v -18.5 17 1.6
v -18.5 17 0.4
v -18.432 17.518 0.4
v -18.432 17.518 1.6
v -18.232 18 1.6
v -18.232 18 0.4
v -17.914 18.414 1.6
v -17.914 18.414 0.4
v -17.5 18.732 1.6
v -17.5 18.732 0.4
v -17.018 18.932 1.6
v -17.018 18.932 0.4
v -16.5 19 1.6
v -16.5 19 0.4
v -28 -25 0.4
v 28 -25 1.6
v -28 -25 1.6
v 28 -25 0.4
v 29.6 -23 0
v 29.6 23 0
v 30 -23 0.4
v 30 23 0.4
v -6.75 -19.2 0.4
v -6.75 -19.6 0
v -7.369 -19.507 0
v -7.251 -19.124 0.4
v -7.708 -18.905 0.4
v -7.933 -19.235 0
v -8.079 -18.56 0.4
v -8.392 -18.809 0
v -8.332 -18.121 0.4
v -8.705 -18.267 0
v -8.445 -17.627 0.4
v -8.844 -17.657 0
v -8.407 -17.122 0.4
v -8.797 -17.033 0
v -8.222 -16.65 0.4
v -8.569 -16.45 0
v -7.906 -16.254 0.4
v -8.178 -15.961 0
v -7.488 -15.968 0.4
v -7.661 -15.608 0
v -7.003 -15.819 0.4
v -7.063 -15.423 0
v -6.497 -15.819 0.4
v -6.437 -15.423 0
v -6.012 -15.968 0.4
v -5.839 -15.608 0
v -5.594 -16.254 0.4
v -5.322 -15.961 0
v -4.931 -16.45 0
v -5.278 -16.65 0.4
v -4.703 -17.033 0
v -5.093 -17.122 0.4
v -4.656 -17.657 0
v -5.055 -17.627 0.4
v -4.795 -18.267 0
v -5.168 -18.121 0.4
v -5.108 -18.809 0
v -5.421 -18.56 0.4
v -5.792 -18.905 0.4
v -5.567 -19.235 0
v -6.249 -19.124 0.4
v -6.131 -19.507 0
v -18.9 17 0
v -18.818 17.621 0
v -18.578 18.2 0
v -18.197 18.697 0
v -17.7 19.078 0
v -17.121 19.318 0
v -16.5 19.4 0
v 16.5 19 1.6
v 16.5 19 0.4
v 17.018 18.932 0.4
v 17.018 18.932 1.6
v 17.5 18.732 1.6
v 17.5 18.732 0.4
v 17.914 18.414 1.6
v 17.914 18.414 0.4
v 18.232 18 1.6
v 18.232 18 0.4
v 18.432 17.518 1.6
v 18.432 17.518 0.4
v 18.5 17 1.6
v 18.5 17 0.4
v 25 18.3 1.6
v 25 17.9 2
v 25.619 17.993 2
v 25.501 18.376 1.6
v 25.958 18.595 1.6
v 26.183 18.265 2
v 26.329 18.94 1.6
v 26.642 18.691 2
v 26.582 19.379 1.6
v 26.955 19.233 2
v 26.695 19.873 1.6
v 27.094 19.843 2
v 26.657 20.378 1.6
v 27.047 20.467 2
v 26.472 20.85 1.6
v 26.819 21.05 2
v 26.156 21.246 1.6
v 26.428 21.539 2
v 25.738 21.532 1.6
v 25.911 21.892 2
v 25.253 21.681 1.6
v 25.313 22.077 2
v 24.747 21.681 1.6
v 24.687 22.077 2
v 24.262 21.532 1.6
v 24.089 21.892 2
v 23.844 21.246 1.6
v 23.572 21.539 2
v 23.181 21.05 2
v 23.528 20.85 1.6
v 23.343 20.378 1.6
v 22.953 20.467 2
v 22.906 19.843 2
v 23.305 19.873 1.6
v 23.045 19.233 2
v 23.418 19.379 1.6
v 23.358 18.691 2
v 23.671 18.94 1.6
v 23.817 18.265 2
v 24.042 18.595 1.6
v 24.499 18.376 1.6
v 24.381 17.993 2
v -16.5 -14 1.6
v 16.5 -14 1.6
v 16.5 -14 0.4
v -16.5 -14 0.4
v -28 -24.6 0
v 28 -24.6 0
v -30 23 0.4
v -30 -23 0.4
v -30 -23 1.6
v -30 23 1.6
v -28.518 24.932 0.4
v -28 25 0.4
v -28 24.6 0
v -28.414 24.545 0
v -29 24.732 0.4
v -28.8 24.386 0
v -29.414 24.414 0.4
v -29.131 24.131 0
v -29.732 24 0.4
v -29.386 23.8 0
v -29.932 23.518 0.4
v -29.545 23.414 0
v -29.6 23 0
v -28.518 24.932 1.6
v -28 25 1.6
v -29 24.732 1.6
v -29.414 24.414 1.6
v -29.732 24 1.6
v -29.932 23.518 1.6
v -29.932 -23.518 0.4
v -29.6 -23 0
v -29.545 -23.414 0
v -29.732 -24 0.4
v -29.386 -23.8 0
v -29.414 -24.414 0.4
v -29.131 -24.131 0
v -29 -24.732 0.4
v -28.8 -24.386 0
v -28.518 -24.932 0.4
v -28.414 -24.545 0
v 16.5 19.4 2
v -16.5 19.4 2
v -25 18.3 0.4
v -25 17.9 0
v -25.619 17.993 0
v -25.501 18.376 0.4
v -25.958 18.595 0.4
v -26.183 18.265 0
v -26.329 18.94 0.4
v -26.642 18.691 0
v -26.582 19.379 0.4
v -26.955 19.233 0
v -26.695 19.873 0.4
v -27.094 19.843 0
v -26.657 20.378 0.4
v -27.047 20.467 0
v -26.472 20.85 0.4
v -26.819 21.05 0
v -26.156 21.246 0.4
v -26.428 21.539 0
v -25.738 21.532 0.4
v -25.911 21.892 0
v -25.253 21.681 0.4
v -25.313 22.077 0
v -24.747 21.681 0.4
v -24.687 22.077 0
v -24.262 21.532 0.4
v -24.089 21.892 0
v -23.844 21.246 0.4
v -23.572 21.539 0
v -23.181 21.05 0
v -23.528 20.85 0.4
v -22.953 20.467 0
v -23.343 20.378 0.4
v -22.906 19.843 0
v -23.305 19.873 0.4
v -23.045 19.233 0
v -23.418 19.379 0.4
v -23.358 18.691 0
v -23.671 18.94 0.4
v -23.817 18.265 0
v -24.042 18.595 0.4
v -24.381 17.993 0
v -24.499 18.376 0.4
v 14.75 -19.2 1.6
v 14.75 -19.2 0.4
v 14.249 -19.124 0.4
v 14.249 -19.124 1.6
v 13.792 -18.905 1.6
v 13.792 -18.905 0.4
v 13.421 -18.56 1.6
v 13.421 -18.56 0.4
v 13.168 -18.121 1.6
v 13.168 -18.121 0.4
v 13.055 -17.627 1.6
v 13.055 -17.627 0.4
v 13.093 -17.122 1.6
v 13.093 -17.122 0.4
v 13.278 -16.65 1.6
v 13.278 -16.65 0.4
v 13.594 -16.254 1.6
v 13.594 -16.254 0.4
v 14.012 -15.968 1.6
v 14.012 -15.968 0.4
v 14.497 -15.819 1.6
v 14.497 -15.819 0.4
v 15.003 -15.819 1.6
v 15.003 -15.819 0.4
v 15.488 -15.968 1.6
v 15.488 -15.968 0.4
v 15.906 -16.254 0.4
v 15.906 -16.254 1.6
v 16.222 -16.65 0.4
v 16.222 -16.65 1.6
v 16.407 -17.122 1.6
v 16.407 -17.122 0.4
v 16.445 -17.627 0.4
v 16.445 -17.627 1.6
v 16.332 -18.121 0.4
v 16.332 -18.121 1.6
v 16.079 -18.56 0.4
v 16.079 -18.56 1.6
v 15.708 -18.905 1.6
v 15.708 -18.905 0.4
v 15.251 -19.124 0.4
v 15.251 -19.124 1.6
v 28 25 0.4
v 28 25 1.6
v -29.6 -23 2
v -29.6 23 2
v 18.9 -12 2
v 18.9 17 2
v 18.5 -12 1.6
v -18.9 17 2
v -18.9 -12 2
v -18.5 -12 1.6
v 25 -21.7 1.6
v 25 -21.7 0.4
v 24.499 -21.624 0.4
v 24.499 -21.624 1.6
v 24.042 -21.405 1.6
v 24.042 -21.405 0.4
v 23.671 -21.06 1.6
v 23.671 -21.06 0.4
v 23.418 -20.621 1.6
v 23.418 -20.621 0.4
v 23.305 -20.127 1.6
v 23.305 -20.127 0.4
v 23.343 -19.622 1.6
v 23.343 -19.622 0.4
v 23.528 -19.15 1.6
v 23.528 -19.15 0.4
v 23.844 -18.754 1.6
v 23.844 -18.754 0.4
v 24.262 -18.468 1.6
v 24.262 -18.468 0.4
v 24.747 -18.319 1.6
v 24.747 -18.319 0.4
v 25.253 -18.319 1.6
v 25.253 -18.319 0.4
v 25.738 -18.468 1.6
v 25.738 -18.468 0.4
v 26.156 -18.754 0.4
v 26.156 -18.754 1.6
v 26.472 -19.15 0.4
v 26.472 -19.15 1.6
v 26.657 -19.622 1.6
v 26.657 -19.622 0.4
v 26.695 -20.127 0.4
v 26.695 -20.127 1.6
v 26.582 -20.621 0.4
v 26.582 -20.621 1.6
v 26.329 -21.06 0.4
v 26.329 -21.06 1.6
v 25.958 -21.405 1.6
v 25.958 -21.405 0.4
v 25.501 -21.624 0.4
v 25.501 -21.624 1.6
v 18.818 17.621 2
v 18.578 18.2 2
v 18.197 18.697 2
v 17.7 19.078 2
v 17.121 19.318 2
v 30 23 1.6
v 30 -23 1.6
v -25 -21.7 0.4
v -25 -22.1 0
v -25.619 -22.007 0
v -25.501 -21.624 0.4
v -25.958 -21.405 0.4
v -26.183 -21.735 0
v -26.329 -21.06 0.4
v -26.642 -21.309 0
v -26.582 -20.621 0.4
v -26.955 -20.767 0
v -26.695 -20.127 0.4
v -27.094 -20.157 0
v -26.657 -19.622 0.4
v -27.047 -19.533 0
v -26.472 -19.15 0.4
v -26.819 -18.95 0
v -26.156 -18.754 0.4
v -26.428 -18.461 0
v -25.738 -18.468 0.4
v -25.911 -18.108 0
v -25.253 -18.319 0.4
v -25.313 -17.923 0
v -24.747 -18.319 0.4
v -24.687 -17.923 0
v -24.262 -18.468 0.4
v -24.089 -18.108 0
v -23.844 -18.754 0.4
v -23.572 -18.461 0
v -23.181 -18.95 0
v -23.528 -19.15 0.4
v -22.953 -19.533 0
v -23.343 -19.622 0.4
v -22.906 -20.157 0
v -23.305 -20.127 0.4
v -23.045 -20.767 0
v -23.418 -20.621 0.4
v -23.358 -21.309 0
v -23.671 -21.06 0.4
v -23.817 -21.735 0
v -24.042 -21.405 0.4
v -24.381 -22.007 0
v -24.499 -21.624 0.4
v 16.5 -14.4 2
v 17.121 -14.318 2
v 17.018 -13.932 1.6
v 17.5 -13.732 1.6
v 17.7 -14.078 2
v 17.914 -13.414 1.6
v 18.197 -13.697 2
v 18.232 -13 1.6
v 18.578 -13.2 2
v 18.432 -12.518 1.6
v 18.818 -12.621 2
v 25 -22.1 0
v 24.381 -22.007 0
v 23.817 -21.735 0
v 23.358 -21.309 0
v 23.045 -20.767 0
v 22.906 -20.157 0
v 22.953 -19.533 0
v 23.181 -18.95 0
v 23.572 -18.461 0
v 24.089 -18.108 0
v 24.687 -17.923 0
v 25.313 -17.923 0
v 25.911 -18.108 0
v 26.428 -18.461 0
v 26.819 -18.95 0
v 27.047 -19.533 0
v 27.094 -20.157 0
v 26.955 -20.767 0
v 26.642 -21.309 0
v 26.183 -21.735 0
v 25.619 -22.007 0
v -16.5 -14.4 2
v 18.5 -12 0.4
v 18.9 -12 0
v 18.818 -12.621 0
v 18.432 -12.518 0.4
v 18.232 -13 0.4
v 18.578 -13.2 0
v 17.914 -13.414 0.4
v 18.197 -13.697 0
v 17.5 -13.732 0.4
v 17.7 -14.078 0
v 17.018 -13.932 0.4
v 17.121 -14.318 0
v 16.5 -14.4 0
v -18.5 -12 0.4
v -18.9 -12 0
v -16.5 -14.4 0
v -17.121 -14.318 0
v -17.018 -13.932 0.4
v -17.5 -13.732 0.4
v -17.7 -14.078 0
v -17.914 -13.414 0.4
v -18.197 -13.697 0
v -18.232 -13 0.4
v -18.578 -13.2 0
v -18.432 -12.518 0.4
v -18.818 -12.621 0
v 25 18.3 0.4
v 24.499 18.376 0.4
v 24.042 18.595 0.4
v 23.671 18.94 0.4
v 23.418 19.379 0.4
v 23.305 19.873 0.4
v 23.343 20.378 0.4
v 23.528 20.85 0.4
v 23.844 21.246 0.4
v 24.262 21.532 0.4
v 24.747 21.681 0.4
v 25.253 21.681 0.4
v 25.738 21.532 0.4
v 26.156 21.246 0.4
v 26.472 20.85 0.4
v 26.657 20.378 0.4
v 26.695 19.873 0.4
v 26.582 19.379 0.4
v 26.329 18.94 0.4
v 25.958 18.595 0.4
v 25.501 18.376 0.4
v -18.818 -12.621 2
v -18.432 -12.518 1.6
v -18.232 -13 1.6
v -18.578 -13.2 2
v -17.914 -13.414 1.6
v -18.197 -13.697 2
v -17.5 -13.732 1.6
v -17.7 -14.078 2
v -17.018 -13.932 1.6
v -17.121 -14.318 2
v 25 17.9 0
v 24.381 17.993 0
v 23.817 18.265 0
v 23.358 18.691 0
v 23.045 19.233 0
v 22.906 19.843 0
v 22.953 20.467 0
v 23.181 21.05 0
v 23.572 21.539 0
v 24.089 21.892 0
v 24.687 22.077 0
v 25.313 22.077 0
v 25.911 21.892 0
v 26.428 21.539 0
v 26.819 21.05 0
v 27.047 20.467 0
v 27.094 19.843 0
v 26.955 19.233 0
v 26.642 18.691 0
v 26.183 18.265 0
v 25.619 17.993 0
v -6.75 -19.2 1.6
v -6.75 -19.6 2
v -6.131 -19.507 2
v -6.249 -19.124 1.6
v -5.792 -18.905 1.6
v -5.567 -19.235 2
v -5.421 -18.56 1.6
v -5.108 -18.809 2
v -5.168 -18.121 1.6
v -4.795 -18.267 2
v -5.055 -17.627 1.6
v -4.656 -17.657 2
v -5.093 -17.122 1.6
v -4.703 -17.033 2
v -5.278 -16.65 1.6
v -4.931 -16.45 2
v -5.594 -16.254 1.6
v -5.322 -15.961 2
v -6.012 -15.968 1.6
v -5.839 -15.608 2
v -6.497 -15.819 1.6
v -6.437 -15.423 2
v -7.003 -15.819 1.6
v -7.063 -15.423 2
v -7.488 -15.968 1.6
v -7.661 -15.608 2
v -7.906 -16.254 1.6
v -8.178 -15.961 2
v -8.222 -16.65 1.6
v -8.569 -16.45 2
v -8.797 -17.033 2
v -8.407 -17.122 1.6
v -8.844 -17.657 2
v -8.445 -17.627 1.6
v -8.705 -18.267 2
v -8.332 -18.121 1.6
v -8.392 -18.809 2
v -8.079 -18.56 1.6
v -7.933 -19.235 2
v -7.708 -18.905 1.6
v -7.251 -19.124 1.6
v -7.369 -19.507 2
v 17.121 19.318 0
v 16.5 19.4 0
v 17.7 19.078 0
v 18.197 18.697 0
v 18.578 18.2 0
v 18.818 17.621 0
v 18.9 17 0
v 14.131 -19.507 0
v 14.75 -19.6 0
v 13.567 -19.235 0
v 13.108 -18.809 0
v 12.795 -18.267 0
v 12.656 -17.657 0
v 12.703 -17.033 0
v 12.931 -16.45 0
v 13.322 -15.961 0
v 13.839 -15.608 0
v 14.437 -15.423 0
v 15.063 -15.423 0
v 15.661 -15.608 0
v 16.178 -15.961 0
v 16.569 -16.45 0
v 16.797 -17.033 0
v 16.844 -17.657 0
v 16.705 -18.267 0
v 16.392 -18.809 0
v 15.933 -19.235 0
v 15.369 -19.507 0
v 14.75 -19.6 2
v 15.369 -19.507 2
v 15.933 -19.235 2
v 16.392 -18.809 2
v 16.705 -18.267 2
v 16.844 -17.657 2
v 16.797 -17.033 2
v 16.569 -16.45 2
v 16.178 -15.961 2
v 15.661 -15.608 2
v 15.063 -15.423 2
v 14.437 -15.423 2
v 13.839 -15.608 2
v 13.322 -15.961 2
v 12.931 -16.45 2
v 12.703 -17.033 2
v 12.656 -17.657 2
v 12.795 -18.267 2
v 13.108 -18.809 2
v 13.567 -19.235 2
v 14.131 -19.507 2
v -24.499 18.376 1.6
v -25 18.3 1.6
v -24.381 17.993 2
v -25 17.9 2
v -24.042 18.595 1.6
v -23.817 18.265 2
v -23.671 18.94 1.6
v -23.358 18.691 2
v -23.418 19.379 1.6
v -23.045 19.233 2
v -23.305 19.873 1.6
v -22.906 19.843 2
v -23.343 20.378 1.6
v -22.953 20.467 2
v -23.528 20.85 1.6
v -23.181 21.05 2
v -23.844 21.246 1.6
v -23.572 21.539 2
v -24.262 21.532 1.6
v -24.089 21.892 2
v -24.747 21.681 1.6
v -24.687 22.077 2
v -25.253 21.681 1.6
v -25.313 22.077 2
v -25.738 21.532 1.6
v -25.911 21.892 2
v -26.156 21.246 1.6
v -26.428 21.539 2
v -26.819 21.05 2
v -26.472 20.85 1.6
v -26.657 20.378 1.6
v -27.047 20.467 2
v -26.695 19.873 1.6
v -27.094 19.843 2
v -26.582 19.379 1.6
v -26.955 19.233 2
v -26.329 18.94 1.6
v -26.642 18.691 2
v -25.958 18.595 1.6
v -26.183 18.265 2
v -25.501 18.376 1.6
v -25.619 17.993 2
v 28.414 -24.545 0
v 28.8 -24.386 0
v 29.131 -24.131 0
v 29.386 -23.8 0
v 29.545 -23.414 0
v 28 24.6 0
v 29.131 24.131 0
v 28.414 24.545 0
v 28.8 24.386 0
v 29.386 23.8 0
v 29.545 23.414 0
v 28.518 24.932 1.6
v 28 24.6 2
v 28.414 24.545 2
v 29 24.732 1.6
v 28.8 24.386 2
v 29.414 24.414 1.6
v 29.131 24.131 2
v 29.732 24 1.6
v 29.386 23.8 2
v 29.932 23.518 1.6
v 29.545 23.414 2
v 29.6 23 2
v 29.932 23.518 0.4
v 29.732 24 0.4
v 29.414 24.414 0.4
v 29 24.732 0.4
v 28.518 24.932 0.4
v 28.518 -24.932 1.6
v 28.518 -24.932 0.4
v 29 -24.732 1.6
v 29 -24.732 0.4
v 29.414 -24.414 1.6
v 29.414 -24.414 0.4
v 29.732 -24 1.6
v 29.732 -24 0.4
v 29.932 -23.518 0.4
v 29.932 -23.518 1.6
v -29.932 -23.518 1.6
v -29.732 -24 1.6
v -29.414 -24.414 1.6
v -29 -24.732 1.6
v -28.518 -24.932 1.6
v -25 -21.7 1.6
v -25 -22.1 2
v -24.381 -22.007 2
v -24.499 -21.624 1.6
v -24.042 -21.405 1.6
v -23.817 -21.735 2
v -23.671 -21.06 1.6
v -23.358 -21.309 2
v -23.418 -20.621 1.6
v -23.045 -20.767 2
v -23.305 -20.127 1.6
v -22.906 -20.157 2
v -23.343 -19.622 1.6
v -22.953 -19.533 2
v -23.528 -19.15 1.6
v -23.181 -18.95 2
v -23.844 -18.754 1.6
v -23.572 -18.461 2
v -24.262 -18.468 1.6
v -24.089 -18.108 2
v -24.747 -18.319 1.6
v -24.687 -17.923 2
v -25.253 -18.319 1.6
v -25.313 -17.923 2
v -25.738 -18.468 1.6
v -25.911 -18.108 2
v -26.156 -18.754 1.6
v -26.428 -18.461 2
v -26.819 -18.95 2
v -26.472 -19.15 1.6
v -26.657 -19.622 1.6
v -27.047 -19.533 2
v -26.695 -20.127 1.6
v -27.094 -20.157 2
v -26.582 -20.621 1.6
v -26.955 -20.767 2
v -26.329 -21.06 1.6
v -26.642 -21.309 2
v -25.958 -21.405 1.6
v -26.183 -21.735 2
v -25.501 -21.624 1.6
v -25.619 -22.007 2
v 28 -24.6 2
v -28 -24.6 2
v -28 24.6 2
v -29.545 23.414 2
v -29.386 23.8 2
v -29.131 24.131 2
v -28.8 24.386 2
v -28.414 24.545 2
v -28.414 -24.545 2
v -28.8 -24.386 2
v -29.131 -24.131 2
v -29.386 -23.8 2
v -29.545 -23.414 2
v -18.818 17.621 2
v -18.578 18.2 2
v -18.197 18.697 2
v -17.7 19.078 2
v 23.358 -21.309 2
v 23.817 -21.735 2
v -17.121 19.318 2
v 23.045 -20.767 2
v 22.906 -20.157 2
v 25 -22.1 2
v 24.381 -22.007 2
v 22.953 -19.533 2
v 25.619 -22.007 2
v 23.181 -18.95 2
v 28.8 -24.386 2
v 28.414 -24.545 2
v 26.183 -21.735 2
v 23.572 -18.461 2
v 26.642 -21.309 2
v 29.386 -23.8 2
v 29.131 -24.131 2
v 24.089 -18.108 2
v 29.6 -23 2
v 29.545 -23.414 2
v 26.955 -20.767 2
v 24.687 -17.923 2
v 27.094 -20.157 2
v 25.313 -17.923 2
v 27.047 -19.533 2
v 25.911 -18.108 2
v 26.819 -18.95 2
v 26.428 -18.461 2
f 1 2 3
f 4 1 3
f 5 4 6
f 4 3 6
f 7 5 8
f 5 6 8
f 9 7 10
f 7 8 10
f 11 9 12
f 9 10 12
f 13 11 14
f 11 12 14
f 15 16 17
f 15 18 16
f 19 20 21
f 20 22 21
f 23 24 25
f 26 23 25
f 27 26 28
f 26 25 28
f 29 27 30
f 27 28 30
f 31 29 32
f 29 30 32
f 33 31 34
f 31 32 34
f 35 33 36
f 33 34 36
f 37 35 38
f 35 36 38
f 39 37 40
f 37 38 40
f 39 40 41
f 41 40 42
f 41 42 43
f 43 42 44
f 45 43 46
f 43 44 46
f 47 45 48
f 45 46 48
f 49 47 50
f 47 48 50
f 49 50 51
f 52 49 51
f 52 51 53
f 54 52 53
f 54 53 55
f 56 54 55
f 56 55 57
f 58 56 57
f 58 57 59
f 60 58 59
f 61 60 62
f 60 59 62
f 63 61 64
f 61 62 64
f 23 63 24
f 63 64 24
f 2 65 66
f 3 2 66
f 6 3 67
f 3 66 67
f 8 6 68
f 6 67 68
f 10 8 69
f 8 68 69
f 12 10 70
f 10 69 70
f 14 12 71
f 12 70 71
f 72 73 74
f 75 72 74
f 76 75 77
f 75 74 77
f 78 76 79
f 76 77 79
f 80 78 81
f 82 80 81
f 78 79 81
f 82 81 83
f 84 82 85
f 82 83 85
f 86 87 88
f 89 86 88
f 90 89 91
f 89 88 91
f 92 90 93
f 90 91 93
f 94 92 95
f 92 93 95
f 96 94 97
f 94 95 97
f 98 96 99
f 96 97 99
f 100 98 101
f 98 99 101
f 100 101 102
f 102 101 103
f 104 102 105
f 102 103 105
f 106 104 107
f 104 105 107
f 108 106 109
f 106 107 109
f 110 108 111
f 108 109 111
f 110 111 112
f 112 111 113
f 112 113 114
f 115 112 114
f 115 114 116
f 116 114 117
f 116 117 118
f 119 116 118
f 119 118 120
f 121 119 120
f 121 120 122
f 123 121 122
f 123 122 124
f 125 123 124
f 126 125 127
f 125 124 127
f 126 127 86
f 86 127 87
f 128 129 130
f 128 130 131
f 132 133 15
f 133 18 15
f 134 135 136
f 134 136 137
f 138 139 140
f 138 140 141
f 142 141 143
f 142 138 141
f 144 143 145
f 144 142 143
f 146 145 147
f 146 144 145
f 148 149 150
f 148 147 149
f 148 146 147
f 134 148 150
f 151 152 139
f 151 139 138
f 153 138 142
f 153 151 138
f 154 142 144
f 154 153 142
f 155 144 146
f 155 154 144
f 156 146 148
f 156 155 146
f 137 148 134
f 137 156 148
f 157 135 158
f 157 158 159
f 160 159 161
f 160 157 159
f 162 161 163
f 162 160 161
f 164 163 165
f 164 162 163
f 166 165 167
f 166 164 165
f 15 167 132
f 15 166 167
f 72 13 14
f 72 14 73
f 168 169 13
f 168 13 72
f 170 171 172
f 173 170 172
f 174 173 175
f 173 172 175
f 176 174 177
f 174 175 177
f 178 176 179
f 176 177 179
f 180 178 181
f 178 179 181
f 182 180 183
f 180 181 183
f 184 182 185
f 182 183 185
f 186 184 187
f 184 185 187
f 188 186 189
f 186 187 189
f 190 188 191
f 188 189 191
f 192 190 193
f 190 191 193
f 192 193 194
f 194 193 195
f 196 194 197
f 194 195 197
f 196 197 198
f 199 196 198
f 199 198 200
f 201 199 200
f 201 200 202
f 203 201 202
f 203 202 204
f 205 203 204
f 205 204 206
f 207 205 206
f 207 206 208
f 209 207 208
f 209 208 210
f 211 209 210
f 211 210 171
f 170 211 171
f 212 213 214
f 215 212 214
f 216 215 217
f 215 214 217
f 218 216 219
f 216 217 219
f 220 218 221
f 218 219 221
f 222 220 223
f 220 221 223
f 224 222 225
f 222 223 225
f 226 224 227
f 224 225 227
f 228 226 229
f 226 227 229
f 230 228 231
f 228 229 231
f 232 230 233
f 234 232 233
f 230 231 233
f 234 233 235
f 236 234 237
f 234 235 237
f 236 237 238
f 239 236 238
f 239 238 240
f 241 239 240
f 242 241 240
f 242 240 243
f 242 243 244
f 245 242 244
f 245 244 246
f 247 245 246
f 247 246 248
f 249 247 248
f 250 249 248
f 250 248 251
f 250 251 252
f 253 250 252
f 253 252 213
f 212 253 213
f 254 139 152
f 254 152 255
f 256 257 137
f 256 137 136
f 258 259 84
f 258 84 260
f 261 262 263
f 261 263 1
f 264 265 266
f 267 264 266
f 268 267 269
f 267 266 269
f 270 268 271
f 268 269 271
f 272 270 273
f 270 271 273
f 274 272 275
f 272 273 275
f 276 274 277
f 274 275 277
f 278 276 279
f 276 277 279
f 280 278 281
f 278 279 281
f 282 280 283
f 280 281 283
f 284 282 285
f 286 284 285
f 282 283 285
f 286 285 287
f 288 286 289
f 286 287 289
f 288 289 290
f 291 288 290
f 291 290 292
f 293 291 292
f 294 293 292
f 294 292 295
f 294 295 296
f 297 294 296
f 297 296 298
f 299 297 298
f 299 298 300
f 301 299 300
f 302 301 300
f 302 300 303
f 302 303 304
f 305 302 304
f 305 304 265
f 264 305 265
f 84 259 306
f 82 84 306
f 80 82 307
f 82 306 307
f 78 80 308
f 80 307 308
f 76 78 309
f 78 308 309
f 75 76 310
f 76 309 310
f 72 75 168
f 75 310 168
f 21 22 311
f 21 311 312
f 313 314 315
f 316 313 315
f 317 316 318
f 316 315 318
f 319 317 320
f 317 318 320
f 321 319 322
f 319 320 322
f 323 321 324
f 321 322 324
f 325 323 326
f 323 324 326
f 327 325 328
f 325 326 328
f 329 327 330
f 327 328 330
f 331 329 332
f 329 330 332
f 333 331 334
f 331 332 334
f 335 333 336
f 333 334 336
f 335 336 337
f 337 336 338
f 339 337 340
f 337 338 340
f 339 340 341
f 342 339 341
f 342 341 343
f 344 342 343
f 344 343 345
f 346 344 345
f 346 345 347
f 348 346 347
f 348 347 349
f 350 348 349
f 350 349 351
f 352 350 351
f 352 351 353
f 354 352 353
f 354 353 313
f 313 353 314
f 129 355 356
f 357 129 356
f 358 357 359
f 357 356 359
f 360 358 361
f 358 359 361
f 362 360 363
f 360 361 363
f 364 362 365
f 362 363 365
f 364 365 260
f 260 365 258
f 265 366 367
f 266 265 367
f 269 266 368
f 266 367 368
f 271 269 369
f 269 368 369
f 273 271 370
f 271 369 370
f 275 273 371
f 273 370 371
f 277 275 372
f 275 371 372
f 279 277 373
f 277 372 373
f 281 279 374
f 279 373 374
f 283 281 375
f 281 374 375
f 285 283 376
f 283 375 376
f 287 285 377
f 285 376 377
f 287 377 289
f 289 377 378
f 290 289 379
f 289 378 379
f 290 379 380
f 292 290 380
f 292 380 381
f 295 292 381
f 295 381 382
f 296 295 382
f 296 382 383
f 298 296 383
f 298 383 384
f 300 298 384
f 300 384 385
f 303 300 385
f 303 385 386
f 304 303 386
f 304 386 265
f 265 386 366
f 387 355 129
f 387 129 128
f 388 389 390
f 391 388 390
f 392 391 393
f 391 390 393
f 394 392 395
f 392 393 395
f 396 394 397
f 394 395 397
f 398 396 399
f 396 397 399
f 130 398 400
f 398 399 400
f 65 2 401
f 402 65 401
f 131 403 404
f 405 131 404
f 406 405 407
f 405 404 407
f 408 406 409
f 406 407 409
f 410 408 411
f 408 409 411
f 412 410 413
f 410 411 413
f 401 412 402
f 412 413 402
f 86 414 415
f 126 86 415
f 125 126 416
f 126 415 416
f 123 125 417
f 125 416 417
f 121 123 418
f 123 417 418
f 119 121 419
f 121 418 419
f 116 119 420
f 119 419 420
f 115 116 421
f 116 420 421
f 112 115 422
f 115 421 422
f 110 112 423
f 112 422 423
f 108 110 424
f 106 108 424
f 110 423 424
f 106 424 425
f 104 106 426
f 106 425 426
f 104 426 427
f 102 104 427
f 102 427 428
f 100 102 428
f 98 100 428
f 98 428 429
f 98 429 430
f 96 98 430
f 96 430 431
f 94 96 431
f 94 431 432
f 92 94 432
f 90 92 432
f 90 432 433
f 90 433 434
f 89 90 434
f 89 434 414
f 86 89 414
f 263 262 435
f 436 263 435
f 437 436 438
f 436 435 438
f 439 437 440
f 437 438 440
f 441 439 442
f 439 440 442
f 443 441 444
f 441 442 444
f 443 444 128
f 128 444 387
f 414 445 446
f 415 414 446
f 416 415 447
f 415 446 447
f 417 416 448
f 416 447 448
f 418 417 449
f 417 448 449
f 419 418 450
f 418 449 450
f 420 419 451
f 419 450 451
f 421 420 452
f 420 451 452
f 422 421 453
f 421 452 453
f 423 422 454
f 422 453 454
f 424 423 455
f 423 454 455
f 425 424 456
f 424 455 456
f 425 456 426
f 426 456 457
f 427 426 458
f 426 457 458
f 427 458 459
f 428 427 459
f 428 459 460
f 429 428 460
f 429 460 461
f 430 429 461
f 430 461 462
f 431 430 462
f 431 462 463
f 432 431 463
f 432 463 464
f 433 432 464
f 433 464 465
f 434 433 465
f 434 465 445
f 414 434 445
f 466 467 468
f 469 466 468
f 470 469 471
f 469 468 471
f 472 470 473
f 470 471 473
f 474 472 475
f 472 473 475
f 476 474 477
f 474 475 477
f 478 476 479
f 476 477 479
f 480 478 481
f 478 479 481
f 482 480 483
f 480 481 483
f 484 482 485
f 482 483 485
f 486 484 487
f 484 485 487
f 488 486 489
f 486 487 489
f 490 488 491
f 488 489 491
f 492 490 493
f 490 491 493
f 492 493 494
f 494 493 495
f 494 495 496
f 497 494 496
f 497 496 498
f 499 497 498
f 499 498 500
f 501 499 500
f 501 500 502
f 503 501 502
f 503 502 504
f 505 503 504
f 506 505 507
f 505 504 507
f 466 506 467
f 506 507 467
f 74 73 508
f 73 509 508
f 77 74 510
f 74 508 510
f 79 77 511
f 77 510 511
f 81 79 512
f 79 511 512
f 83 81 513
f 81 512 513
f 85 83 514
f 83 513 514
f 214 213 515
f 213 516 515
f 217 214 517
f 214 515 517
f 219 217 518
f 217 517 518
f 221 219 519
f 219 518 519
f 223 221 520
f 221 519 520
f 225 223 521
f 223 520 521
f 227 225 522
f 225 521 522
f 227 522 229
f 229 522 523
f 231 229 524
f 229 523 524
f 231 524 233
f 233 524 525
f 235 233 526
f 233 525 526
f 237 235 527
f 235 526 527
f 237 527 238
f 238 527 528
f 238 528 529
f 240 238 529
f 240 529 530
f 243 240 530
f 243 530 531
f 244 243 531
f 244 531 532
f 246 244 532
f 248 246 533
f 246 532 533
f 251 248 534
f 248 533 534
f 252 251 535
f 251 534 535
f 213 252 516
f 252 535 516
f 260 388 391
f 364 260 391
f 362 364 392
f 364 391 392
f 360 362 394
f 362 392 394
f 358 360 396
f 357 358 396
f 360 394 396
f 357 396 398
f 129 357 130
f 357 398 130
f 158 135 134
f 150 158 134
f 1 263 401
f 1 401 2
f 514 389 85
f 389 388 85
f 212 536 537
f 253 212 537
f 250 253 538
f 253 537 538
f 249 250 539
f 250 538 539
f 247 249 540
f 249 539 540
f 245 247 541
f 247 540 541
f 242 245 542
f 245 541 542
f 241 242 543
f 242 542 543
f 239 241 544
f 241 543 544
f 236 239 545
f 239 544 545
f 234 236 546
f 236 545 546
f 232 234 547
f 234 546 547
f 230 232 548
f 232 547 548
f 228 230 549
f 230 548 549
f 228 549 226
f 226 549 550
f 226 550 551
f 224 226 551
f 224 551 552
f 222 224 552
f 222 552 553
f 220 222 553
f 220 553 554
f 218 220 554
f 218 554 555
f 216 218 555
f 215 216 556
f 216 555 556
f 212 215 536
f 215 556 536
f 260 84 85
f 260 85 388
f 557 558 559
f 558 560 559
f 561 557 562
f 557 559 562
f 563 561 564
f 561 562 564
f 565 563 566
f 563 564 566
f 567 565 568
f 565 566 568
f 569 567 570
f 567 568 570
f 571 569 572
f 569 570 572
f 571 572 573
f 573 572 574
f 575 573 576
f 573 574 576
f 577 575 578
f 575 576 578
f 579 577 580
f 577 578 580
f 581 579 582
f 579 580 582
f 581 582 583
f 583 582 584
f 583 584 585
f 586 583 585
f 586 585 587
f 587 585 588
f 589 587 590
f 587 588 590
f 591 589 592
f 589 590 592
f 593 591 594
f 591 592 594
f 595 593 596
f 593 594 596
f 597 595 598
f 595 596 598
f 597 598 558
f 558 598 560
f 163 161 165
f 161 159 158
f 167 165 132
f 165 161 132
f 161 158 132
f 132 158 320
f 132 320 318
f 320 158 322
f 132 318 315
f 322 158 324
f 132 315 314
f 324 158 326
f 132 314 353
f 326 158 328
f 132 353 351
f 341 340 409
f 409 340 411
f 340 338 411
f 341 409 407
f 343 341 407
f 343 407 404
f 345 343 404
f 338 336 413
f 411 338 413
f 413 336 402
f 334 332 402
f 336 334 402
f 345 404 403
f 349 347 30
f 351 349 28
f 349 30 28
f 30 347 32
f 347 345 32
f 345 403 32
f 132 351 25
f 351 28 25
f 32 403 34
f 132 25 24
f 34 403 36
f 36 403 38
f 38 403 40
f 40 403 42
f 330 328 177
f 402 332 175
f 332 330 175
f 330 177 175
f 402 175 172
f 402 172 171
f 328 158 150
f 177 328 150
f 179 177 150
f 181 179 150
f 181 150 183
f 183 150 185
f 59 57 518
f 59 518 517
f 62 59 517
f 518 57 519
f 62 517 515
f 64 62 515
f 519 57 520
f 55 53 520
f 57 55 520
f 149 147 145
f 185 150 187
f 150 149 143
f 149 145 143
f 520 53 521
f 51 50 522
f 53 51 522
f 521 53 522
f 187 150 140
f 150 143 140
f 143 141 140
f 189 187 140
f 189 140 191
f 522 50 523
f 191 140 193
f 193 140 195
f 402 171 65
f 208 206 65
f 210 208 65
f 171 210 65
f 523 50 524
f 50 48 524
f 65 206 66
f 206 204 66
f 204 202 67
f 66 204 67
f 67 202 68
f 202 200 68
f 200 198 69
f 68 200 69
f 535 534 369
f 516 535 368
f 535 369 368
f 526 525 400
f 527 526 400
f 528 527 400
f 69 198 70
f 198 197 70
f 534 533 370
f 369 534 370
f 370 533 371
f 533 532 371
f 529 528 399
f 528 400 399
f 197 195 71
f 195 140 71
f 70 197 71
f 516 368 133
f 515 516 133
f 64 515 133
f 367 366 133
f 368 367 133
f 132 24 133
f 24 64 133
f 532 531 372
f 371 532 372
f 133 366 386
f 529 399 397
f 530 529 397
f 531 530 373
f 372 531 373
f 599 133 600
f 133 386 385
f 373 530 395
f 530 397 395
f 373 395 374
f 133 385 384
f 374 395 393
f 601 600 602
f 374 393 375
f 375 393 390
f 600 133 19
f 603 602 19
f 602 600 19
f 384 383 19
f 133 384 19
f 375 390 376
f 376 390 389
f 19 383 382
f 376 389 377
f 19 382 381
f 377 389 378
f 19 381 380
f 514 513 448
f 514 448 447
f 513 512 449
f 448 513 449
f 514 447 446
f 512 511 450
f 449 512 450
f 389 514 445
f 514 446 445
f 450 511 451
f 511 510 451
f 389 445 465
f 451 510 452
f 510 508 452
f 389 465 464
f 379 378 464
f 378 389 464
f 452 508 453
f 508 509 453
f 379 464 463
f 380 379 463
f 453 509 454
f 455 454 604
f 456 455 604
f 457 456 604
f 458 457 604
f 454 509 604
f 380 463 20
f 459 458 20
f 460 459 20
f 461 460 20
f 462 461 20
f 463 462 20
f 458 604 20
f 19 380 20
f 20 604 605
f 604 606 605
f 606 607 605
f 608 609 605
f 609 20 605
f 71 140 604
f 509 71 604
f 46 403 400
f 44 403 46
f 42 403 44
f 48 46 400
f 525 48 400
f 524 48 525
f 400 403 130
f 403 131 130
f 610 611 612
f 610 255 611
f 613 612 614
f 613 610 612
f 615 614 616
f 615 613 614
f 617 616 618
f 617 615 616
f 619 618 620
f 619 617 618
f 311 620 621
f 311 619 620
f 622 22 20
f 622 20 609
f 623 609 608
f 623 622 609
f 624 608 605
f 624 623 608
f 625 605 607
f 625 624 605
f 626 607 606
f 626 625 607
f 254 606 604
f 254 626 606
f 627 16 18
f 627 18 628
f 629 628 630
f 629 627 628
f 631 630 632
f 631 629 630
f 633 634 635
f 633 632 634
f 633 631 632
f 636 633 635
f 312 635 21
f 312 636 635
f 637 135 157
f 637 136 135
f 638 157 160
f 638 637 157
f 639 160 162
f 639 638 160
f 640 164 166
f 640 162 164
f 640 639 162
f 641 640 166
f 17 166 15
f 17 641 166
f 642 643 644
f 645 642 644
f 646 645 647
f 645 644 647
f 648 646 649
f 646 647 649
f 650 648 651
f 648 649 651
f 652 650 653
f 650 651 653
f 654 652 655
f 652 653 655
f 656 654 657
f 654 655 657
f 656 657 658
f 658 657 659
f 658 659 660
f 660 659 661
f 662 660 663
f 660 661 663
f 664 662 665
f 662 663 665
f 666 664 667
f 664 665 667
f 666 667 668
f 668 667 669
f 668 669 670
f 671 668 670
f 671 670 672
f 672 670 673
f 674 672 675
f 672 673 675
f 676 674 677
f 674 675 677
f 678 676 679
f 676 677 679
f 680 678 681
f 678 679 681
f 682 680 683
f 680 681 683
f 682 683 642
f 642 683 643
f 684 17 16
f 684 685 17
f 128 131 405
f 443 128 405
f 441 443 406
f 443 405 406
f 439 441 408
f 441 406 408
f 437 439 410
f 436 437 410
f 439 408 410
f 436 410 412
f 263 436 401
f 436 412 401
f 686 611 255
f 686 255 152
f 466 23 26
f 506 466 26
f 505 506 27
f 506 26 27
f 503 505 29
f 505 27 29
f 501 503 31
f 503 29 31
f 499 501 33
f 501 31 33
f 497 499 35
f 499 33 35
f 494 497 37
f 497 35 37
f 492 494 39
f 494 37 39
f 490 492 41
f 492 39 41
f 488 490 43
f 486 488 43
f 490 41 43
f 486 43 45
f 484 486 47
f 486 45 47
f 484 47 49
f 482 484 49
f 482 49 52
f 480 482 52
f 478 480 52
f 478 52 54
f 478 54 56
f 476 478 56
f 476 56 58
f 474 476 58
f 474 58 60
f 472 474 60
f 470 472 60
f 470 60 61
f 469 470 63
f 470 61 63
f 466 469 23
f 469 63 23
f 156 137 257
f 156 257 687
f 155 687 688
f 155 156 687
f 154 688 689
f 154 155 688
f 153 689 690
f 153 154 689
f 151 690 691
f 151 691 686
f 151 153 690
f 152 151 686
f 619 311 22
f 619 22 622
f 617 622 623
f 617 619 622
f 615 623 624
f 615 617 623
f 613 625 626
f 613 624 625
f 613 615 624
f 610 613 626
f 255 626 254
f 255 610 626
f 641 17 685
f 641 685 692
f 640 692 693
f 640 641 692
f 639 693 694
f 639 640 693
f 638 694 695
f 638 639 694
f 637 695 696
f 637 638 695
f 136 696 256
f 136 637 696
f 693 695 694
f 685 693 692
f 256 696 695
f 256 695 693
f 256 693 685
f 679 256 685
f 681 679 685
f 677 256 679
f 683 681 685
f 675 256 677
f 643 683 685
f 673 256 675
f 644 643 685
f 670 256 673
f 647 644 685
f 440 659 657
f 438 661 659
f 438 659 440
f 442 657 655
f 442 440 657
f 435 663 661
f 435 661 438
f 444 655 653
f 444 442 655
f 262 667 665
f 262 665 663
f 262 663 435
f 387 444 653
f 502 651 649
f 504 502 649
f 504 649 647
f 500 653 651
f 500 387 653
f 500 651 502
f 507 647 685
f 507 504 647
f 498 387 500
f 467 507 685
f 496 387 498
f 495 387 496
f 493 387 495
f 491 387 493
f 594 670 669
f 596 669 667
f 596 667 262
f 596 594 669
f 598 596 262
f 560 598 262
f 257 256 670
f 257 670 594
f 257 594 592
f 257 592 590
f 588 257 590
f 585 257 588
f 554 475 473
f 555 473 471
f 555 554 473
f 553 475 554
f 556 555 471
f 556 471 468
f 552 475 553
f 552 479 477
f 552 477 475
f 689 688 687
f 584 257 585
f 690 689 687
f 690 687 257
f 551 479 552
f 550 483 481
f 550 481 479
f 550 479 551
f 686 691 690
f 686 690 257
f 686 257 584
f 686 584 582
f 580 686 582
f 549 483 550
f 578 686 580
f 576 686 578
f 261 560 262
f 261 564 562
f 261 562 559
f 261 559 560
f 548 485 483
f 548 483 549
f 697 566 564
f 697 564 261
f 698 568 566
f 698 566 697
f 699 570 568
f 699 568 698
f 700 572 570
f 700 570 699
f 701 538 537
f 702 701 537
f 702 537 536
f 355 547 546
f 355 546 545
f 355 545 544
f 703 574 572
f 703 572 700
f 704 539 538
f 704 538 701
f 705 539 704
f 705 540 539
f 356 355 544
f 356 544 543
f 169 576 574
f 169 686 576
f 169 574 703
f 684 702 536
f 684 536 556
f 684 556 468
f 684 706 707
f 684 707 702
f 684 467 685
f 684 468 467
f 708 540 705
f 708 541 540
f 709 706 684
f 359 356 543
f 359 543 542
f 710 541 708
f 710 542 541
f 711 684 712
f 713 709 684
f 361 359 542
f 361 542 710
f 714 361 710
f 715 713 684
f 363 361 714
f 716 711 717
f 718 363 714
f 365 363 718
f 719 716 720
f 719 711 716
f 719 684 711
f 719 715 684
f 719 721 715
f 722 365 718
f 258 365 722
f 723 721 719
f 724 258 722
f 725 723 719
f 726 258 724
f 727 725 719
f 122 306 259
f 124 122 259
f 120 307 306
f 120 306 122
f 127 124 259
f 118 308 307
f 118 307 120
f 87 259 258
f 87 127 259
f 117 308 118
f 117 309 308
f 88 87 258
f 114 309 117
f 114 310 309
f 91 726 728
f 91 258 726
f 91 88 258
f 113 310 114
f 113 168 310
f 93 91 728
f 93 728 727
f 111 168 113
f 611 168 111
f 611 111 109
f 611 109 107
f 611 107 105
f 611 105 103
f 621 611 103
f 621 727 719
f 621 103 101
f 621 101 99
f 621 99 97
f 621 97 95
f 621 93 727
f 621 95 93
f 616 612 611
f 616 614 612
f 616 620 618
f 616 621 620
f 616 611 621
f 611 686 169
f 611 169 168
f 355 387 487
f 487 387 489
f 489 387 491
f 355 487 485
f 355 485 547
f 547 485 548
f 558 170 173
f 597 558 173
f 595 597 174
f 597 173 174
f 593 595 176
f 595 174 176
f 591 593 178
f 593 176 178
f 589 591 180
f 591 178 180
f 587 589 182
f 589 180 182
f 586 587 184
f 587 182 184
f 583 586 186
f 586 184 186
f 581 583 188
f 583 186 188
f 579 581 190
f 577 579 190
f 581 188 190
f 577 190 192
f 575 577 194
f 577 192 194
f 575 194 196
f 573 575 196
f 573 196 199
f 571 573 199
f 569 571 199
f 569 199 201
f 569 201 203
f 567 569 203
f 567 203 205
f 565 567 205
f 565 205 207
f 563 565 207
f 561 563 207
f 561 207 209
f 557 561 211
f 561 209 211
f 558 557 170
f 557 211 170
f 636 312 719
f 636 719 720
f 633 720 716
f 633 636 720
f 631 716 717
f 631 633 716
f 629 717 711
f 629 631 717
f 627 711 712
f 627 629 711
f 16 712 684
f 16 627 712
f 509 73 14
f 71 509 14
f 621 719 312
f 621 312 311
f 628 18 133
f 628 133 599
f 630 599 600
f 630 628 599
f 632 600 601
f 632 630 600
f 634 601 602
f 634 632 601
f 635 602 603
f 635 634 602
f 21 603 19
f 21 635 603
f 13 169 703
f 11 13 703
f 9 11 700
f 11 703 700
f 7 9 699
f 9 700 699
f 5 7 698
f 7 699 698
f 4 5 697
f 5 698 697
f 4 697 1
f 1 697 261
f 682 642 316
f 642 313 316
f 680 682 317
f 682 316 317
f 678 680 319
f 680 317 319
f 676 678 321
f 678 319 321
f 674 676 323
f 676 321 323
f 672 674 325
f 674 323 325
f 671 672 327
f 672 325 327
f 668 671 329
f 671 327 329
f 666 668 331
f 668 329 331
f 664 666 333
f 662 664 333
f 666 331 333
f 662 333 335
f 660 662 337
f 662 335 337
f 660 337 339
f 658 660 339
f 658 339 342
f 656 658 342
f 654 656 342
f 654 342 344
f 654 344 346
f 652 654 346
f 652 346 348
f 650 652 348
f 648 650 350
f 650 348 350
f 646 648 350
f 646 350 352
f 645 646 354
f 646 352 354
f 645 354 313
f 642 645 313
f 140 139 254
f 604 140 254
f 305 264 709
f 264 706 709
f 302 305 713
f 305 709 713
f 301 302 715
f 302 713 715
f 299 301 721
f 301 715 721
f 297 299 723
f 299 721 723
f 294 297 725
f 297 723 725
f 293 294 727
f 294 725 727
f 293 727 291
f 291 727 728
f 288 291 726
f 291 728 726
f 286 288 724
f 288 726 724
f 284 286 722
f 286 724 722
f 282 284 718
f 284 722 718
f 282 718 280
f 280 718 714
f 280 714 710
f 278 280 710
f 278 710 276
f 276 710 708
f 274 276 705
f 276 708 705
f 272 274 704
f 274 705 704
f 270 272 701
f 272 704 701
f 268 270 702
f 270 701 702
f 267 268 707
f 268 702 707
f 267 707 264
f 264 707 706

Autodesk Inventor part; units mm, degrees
ref_plane "YZ Plane" through (0, 0, 0) normal (1, 0, 0) x (0, 1, 0)
ref_plane "XZ Plane" through (0, 0, 0) normal (0, 1, 0) x (-1, 0, 0)
ref_plane "XY Plane" through (0, 0, 0) normal (0, 0, 1) x (1, 0, 0)
sketch "Sketch1" plane through (0, 0, 0) normal (0, 0, 1) x (1, 0, 0)
  line L0 (-30, 25) -> (30, 25)
  line L1 (30, 25) -> (30, -25)
  line L2 (30, -25) -> (-30, -25)
  line L3 (-30, -25) -> (-30, 25)
  point P0 (0, 0)
  point P1 (30, 0)
  point P2 (0, 25)
  dimension "d0" = 60
  dimension "d1" = 50
extrude "Extrusion1" add sketch "Sketch1" along normal blind 2
fillet "Fillet1" radius 2 4 edges at (30, 25, 1) (-30, 25, 1) (30, -25, 1) (-30, -25, 1)
sketch "Sketch2" plane through (0, 0, 2) normal (0, 0, 1) x (1, 0, 0)
  line L0 (-25, 20) -> (25, 20) construction
  line L1 (25, 20) -> (25, -20) construction
  line L2 (25, -20) -> (-25, -20) construction
  line L3 (-25, -20) -> (-25, 20) construction
  point P0 (0, 0)
  point P1 (25, 0)
  point P2 (0, 20)
  dimension "d5" = 50
  dimension "d6" = 40
hole "Hole1" at (-25, 20, 2) at (25, 20, 2) at (-25, -20, 2) at (25, -20, 2) direction (0, 0, -1) diameter 3.4 end through all
sketch "Sketch3" plane through (0, 0, 2) normal (0, 0, 1) x (1, 0, 0)
  line L0 (-18.5, 19) -> (18.5, 19)
  line L1 (18.5, 19) -> (18.5, -14)
  line L2 (18.5, -14) -> (-18.5, -14)
  line L3 (-18.5, -14) -> (-18.5, 19)
  point P0 (0, 0)
  point P1 (0, 19)
  dimension "d15" = 33
  dimension "d16" = 37
  dimension "d17" = 14
extrude "Extrusion2" cut sketch "Sketch3" against normal blind 2
fillet "Fillet2" radius 2 4 edges at (-18.5, 19, 1) (18.5, 19, 1) (18.5, -14, 1) (-18.5, -14, 1)
sketch "Sketch4" plane through (0, 0, 2) normal (0, 0, 1) x (1, 0, 0)
  line L0 (-6.75, -17.5) -> (14.75, -17.5) construction
  line L1 (16.5, -14) -> (-16.5, -14) projected
  point P0 (0, 0)
  point P1 (4, -17.5)
  dimension "d21" = 21.5
  dimension "d22" = 3.5
  dimension "d33" = 4
hole "Hole2" at (-6.75, -17.5, 2) at (14.75, -17.5, 2) direction (0, 0, -1) diameter 3.4 end through all
chamfer "Chamfer1" distance 0.4 angle 45 44 edges at (0, 25, 2) (-29.4142, 24.4142, 2) (-30, 0, 2) (-29.4142, -24.4142, 2) (0, -25, 2) (29.4142, -24.4142, 2) (30, 0, 2) (29.4142, 24.4142, 2) (0, 25, 0) (-29.4142, 24.4142, 0) (-30, 0, 0) (-29.4142, -24.4142, 0) (0, -25, 0) (29.4142, -24.4142, 0) (30, 0, 0) (29.4142, 24.4142, 0) (-18.5, 2.5, 0) (-17.9142, -13.4142, 0) (0, -14, 0) (17.9142, -13.4142, 0) (18.5, 2.5, 0) (17.9142, 18.4142, 0) (0, 19, 0) (-17.9142, 18.4142, 0) (0, 19, 2) (17.9142, 18.4142, 2) (18.5, 2.5, 2) (17.9142, -13.4142, 2) (0, -14, 2) (-17.9142, -13.4142, 2) (-18.5, 2.5, 2) (-17.9142, 18.4142, 2) (-25, -18.3, 2) (25, -18.3, 2) (-25, 21.7, 2) (25, 21.7, 2) (-6.75, -15.8, 2) (14.75, -15.8, 2) (-25, -18.3, 0) (25, -18.3, 0) (-25, 21.7, 0) (25, 21.7, 0) (-6.75, -15.8, 0) (14.75, -15.8, 0)
properties part number "bradboardclip" material "ABS Plastic"
